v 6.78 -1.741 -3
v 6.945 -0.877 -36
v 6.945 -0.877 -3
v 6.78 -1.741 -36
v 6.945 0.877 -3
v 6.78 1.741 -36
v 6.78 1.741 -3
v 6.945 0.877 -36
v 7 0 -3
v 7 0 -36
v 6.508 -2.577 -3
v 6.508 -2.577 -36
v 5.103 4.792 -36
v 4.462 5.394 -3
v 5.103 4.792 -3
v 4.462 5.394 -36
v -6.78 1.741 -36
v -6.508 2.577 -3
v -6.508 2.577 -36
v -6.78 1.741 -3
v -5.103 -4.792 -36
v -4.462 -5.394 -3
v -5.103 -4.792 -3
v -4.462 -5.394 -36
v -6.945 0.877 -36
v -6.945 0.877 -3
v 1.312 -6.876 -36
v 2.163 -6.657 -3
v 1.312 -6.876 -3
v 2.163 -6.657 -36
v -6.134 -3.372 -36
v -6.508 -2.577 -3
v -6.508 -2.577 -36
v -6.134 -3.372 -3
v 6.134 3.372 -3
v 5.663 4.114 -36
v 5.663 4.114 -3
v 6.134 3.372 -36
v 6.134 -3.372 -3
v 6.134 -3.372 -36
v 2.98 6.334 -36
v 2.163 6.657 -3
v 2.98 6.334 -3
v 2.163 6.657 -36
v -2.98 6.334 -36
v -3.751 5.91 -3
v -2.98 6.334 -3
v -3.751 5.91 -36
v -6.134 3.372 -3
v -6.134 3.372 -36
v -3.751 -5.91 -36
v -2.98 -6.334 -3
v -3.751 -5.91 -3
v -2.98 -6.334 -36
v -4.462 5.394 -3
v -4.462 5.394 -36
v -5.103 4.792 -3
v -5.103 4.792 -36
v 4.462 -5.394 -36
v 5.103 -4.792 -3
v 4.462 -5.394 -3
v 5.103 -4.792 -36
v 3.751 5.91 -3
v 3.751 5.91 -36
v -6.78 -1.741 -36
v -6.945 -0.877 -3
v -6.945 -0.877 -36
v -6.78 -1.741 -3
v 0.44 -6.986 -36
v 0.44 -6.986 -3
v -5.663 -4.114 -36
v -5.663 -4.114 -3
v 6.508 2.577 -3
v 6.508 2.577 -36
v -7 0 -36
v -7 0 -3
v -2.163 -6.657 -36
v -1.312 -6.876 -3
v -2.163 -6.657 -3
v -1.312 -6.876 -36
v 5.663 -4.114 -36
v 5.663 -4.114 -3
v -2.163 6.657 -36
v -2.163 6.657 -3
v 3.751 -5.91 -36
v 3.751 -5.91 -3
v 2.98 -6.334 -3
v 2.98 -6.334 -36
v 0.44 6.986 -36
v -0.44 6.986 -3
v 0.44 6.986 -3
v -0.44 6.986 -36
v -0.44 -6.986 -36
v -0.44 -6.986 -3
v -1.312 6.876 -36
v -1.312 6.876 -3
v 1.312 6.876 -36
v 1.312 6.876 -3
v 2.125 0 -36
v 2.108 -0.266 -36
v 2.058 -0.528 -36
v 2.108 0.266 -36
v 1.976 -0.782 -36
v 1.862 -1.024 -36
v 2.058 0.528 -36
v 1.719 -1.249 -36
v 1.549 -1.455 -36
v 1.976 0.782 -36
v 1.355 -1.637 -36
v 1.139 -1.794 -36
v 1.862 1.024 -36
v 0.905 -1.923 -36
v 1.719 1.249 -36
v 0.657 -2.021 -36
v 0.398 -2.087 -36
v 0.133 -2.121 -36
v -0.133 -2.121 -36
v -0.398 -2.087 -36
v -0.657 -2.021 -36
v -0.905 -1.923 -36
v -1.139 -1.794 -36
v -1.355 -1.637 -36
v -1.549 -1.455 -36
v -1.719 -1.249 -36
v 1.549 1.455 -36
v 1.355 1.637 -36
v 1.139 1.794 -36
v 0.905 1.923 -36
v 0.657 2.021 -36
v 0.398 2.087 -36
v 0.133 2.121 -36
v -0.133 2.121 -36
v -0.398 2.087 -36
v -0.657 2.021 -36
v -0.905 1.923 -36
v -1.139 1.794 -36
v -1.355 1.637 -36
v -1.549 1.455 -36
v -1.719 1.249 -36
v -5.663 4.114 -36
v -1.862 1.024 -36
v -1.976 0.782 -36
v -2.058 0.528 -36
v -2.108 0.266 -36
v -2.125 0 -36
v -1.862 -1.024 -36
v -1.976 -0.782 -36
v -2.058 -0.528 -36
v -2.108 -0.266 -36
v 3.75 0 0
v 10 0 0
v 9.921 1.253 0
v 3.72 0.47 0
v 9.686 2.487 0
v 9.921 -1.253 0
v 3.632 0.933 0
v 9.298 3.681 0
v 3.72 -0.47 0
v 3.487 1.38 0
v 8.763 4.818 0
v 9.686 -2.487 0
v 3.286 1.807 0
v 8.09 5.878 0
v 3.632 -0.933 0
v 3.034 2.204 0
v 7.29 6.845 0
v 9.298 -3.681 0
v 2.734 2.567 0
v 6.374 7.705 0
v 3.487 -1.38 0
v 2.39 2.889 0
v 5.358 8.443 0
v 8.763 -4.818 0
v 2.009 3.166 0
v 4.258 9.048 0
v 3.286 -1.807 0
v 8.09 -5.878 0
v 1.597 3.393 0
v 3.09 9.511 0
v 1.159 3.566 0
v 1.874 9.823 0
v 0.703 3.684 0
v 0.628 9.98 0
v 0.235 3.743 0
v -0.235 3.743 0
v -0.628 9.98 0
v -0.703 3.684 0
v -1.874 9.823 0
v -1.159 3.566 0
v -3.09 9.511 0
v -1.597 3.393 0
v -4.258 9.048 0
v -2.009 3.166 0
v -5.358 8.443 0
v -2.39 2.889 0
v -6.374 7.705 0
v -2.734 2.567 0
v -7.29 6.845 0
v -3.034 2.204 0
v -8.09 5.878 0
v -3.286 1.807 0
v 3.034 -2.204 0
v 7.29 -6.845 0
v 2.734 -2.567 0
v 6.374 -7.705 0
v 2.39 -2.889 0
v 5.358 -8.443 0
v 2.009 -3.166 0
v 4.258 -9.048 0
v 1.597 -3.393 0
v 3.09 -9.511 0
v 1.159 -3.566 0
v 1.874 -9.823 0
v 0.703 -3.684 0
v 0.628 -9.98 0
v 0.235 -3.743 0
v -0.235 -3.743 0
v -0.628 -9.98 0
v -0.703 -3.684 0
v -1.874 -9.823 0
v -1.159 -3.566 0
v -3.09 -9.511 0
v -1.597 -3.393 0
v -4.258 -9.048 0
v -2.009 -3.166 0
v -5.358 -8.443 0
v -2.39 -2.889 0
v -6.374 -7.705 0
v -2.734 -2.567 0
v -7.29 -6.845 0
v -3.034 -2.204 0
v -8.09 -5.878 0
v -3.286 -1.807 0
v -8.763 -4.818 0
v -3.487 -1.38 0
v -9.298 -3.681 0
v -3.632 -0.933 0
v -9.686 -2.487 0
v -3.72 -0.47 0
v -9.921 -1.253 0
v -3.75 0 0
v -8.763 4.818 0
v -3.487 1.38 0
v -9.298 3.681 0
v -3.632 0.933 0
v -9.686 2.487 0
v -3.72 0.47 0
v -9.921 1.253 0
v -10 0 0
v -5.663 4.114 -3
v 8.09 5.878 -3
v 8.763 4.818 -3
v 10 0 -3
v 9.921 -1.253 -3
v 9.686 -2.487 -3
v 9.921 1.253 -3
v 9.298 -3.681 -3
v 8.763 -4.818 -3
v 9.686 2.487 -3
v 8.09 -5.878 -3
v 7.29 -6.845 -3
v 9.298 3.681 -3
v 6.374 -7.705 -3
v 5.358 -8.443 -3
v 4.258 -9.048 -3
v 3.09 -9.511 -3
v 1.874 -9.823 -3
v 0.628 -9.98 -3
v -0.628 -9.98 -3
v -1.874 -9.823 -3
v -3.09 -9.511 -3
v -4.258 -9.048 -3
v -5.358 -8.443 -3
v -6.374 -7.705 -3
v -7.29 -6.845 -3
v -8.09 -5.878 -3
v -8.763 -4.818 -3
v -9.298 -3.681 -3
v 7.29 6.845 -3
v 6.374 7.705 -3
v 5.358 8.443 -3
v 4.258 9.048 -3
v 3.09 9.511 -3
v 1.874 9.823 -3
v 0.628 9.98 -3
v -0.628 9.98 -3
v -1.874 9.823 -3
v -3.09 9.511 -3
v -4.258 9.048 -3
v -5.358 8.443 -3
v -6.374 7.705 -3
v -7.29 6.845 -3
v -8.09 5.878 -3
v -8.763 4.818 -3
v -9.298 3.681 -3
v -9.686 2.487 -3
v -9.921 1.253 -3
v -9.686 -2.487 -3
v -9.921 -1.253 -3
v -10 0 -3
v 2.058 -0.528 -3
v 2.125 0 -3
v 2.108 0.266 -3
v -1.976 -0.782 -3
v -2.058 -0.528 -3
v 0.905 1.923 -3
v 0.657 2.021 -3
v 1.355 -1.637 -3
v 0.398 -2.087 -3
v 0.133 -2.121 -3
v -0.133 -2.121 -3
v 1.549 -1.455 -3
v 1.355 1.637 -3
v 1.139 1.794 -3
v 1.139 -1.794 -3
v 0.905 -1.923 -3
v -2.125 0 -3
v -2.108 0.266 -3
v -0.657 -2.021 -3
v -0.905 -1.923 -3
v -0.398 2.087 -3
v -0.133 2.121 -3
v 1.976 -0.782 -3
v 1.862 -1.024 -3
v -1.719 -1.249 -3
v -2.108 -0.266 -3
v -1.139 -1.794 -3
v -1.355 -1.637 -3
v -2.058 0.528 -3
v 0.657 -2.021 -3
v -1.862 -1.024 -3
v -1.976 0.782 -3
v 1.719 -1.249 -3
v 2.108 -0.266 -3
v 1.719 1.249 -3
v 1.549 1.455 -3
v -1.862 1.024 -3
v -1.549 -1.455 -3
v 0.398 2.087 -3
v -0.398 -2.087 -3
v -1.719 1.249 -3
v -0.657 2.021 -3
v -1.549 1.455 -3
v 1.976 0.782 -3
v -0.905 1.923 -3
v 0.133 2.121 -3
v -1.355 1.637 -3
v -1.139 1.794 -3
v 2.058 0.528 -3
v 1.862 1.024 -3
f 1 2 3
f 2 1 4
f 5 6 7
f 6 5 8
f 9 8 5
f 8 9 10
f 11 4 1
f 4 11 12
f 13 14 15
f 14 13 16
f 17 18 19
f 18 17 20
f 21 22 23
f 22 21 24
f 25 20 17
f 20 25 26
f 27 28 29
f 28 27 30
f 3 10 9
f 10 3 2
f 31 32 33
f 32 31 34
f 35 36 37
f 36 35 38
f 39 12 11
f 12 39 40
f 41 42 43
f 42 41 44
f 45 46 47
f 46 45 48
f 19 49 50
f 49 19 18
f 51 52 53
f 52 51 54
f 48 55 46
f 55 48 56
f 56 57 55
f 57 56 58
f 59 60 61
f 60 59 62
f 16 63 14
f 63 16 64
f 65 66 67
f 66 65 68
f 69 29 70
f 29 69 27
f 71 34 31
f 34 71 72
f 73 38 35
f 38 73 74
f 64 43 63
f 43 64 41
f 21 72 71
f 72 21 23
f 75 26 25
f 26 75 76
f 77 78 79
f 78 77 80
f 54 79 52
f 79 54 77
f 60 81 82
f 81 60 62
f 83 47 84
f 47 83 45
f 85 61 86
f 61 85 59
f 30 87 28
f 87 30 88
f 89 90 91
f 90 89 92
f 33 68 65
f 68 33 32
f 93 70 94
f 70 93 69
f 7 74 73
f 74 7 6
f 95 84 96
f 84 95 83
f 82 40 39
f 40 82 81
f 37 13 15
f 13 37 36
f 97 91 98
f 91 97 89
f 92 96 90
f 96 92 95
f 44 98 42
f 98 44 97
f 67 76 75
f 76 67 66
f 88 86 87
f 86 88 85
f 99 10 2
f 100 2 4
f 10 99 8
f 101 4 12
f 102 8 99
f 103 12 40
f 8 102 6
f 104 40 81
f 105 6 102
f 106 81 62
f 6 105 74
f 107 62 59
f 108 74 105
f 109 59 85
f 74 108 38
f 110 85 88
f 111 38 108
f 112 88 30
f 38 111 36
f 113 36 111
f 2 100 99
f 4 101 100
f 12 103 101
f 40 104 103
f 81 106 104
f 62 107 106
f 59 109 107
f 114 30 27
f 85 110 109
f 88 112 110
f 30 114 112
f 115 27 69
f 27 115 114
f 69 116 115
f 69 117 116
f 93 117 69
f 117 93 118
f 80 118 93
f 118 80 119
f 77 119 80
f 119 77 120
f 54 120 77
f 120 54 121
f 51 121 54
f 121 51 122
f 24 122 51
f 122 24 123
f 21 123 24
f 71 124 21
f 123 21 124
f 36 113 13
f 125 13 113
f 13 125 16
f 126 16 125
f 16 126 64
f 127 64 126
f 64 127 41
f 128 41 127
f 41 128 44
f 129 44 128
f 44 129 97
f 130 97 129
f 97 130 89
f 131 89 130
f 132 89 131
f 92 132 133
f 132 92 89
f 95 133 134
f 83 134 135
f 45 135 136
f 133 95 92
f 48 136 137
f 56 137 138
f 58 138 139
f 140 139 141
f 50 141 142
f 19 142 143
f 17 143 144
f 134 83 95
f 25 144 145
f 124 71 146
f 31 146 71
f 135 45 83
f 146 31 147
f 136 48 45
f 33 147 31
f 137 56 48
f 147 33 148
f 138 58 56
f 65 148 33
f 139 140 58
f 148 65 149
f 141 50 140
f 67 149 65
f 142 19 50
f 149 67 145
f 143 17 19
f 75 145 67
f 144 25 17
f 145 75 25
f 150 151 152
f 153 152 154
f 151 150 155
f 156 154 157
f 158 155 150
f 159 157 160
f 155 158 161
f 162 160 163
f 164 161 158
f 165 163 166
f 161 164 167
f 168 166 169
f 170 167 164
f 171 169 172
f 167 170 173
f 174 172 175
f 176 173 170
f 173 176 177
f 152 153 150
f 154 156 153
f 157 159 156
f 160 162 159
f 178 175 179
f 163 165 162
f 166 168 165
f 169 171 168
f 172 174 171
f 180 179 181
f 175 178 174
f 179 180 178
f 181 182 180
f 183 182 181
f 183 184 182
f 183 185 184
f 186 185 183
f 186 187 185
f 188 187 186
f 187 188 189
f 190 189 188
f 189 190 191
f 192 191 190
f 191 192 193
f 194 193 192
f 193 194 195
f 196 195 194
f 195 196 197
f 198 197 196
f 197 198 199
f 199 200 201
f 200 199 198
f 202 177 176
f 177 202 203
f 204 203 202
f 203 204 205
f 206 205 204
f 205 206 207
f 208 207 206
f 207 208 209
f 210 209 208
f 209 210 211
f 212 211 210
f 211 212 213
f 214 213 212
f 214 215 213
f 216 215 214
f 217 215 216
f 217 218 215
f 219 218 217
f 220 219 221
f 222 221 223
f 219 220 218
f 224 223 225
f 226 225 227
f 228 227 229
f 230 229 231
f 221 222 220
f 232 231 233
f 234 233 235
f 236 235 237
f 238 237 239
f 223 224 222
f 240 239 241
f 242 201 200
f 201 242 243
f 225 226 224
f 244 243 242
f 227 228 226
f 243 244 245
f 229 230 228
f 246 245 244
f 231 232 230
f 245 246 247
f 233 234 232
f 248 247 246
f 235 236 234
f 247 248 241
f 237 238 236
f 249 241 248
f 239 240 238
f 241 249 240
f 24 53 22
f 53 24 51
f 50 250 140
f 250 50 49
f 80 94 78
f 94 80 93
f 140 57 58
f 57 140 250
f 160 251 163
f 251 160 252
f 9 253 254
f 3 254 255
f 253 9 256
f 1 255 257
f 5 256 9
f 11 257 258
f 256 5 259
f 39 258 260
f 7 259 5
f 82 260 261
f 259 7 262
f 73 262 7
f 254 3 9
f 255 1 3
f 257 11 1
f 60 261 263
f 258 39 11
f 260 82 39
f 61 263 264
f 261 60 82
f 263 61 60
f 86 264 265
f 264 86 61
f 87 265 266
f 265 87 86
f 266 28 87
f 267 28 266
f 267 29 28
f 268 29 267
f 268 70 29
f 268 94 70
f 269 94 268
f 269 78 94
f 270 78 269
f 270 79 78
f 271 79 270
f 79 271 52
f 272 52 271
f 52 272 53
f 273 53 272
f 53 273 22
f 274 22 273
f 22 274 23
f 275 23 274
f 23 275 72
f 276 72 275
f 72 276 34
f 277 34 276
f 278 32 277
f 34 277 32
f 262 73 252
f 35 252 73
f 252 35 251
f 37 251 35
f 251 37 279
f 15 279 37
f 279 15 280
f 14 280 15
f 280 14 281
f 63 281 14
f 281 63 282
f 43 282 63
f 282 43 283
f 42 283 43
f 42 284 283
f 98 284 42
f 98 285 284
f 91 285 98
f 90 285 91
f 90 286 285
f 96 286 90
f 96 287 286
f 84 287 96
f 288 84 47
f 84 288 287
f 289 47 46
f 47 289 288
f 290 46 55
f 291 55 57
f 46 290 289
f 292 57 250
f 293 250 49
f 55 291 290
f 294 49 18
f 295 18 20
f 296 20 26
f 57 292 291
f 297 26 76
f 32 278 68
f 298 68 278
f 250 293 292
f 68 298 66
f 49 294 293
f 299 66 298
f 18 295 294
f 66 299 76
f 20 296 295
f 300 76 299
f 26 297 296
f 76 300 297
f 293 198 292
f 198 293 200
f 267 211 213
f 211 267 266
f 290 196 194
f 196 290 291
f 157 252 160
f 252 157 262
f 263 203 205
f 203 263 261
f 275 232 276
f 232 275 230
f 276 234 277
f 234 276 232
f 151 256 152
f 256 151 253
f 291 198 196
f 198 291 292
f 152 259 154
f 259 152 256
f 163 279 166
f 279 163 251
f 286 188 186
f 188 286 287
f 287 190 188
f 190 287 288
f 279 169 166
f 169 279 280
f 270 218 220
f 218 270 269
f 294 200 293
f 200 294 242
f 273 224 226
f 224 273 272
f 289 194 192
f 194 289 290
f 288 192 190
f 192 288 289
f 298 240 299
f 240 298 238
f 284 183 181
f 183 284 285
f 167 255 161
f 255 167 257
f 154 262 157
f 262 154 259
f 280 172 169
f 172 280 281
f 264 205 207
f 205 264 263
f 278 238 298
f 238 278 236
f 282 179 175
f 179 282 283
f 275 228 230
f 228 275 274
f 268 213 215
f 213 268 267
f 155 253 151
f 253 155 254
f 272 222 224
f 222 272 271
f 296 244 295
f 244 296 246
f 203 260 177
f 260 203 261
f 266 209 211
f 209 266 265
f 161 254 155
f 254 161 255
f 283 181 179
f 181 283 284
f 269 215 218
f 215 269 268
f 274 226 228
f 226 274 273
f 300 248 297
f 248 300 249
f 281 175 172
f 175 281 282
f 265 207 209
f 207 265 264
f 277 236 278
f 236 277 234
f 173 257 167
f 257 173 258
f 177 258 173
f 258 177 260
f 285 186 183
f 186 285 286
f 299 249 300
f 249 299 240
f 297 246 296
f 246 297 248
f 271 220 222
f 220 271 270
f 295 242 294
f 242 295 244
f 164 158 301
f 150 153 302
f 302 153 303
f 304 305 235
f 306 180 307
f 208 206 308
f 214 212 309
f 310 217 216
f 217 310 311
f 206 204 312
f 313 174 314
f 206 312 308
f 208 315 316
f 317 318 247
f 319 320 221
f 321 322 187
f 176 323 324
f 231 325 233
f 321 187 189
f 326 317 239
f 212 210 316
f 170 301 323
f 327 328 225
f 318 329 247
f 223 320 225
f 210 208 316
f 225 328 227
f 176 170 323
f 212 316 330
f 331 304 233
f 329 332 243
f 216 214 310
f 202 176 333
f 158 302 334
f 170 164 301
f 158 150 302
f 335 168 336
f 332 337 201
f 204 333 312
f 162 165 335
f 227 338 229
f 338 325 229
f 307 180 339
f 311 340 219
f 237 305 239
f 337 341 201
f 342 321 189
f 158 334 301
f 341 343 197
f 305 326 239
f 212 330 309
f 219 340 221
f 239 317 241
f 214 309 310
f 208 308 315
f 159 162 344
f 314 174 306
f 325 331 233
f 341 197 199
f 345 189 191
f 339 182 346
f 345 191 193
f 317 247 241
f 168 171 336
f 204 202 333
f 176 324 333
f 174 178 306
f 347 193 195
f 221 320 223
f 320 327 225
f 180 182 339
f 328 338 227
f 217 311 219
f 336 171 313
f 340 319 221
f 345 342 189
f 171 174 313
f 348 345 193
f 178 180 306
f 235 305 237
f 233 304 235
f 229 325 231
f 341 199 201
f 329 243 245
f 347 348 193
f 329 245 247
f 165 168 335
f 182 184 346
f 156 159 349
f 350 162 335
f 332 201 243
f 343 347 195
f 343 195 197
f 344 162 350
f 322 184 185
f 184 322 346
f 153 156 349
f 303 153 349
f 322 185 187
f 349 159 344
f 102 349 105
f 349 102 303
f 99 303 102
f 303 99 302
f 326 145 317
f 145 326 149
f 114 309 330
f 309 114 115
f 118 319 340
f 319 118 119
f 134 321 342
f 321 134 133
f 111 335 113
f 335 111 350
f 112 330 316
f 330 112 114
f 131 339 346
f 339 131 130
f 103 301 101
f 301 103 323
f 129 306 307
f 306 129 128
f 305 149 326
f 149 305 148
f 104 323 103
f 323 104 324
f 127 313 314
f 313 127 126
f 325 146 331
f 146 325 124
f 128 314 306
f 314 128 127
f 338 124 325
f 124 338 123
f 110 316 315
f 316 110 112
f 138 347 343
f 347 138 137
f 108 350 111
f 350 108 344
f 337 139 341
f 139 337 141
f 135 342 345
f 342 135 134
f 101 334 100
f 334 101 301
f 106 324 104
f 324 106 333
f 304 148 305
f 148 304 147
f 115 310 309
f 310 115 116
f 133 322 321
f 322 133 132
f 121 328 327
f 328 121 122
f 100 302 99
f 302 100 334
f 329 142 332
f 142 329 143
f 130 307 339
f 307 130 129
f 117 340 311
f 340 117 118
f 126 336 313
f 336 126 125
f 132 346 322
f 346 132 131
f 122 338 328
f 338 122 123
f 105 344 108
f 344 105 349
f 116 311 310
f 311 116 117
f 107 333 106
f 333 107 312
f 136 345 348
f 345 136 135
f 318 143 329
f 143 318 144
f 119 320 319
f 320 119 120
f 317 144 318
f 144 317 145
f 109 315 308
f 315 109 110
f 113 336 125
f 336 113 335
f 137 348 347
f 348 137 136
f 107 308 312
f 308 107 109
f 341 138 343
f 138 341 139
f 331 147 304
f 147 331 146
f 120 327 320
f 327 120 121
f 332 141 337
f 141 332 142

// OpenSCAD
$fn = 50;


difference() {
	union() {
		translate(v = [0, 0, -36.0000000000]) {
			cylinder(h = 36, r = 7.0000000000);
		}
		translate(v = [0, 0, -3.0000000000]) {
			cylinder(h = 3, r = 10.0000000000);
		}
	}
	union() {
		translate(v = [0, 0, 0]) {
			rotate(a = [0, 0, 0]) {
				difference() {
					union() {
						#translate(v = [0, 0, -36.0000000000]) {
							cylinder(h = 36, r = 2.0000000000);
						}
						#translate(v = [0, 0, -3]) {
							cylinder(h = 3, r = 7.0000000000, r1 = 2.1250000000, r2 = 3.7500000000);
						}
						#translate(v = [0, 0, -36.0000000000]) {
							cylinder(h = 36, r = 2.1250000000);
						}
						#translate(v = [0, 0, -36.0000000000]) {
							cylinder(h = 36, r = 2.0000000000);
						}
					}
					union();
				}
			}
		}
	}
}
